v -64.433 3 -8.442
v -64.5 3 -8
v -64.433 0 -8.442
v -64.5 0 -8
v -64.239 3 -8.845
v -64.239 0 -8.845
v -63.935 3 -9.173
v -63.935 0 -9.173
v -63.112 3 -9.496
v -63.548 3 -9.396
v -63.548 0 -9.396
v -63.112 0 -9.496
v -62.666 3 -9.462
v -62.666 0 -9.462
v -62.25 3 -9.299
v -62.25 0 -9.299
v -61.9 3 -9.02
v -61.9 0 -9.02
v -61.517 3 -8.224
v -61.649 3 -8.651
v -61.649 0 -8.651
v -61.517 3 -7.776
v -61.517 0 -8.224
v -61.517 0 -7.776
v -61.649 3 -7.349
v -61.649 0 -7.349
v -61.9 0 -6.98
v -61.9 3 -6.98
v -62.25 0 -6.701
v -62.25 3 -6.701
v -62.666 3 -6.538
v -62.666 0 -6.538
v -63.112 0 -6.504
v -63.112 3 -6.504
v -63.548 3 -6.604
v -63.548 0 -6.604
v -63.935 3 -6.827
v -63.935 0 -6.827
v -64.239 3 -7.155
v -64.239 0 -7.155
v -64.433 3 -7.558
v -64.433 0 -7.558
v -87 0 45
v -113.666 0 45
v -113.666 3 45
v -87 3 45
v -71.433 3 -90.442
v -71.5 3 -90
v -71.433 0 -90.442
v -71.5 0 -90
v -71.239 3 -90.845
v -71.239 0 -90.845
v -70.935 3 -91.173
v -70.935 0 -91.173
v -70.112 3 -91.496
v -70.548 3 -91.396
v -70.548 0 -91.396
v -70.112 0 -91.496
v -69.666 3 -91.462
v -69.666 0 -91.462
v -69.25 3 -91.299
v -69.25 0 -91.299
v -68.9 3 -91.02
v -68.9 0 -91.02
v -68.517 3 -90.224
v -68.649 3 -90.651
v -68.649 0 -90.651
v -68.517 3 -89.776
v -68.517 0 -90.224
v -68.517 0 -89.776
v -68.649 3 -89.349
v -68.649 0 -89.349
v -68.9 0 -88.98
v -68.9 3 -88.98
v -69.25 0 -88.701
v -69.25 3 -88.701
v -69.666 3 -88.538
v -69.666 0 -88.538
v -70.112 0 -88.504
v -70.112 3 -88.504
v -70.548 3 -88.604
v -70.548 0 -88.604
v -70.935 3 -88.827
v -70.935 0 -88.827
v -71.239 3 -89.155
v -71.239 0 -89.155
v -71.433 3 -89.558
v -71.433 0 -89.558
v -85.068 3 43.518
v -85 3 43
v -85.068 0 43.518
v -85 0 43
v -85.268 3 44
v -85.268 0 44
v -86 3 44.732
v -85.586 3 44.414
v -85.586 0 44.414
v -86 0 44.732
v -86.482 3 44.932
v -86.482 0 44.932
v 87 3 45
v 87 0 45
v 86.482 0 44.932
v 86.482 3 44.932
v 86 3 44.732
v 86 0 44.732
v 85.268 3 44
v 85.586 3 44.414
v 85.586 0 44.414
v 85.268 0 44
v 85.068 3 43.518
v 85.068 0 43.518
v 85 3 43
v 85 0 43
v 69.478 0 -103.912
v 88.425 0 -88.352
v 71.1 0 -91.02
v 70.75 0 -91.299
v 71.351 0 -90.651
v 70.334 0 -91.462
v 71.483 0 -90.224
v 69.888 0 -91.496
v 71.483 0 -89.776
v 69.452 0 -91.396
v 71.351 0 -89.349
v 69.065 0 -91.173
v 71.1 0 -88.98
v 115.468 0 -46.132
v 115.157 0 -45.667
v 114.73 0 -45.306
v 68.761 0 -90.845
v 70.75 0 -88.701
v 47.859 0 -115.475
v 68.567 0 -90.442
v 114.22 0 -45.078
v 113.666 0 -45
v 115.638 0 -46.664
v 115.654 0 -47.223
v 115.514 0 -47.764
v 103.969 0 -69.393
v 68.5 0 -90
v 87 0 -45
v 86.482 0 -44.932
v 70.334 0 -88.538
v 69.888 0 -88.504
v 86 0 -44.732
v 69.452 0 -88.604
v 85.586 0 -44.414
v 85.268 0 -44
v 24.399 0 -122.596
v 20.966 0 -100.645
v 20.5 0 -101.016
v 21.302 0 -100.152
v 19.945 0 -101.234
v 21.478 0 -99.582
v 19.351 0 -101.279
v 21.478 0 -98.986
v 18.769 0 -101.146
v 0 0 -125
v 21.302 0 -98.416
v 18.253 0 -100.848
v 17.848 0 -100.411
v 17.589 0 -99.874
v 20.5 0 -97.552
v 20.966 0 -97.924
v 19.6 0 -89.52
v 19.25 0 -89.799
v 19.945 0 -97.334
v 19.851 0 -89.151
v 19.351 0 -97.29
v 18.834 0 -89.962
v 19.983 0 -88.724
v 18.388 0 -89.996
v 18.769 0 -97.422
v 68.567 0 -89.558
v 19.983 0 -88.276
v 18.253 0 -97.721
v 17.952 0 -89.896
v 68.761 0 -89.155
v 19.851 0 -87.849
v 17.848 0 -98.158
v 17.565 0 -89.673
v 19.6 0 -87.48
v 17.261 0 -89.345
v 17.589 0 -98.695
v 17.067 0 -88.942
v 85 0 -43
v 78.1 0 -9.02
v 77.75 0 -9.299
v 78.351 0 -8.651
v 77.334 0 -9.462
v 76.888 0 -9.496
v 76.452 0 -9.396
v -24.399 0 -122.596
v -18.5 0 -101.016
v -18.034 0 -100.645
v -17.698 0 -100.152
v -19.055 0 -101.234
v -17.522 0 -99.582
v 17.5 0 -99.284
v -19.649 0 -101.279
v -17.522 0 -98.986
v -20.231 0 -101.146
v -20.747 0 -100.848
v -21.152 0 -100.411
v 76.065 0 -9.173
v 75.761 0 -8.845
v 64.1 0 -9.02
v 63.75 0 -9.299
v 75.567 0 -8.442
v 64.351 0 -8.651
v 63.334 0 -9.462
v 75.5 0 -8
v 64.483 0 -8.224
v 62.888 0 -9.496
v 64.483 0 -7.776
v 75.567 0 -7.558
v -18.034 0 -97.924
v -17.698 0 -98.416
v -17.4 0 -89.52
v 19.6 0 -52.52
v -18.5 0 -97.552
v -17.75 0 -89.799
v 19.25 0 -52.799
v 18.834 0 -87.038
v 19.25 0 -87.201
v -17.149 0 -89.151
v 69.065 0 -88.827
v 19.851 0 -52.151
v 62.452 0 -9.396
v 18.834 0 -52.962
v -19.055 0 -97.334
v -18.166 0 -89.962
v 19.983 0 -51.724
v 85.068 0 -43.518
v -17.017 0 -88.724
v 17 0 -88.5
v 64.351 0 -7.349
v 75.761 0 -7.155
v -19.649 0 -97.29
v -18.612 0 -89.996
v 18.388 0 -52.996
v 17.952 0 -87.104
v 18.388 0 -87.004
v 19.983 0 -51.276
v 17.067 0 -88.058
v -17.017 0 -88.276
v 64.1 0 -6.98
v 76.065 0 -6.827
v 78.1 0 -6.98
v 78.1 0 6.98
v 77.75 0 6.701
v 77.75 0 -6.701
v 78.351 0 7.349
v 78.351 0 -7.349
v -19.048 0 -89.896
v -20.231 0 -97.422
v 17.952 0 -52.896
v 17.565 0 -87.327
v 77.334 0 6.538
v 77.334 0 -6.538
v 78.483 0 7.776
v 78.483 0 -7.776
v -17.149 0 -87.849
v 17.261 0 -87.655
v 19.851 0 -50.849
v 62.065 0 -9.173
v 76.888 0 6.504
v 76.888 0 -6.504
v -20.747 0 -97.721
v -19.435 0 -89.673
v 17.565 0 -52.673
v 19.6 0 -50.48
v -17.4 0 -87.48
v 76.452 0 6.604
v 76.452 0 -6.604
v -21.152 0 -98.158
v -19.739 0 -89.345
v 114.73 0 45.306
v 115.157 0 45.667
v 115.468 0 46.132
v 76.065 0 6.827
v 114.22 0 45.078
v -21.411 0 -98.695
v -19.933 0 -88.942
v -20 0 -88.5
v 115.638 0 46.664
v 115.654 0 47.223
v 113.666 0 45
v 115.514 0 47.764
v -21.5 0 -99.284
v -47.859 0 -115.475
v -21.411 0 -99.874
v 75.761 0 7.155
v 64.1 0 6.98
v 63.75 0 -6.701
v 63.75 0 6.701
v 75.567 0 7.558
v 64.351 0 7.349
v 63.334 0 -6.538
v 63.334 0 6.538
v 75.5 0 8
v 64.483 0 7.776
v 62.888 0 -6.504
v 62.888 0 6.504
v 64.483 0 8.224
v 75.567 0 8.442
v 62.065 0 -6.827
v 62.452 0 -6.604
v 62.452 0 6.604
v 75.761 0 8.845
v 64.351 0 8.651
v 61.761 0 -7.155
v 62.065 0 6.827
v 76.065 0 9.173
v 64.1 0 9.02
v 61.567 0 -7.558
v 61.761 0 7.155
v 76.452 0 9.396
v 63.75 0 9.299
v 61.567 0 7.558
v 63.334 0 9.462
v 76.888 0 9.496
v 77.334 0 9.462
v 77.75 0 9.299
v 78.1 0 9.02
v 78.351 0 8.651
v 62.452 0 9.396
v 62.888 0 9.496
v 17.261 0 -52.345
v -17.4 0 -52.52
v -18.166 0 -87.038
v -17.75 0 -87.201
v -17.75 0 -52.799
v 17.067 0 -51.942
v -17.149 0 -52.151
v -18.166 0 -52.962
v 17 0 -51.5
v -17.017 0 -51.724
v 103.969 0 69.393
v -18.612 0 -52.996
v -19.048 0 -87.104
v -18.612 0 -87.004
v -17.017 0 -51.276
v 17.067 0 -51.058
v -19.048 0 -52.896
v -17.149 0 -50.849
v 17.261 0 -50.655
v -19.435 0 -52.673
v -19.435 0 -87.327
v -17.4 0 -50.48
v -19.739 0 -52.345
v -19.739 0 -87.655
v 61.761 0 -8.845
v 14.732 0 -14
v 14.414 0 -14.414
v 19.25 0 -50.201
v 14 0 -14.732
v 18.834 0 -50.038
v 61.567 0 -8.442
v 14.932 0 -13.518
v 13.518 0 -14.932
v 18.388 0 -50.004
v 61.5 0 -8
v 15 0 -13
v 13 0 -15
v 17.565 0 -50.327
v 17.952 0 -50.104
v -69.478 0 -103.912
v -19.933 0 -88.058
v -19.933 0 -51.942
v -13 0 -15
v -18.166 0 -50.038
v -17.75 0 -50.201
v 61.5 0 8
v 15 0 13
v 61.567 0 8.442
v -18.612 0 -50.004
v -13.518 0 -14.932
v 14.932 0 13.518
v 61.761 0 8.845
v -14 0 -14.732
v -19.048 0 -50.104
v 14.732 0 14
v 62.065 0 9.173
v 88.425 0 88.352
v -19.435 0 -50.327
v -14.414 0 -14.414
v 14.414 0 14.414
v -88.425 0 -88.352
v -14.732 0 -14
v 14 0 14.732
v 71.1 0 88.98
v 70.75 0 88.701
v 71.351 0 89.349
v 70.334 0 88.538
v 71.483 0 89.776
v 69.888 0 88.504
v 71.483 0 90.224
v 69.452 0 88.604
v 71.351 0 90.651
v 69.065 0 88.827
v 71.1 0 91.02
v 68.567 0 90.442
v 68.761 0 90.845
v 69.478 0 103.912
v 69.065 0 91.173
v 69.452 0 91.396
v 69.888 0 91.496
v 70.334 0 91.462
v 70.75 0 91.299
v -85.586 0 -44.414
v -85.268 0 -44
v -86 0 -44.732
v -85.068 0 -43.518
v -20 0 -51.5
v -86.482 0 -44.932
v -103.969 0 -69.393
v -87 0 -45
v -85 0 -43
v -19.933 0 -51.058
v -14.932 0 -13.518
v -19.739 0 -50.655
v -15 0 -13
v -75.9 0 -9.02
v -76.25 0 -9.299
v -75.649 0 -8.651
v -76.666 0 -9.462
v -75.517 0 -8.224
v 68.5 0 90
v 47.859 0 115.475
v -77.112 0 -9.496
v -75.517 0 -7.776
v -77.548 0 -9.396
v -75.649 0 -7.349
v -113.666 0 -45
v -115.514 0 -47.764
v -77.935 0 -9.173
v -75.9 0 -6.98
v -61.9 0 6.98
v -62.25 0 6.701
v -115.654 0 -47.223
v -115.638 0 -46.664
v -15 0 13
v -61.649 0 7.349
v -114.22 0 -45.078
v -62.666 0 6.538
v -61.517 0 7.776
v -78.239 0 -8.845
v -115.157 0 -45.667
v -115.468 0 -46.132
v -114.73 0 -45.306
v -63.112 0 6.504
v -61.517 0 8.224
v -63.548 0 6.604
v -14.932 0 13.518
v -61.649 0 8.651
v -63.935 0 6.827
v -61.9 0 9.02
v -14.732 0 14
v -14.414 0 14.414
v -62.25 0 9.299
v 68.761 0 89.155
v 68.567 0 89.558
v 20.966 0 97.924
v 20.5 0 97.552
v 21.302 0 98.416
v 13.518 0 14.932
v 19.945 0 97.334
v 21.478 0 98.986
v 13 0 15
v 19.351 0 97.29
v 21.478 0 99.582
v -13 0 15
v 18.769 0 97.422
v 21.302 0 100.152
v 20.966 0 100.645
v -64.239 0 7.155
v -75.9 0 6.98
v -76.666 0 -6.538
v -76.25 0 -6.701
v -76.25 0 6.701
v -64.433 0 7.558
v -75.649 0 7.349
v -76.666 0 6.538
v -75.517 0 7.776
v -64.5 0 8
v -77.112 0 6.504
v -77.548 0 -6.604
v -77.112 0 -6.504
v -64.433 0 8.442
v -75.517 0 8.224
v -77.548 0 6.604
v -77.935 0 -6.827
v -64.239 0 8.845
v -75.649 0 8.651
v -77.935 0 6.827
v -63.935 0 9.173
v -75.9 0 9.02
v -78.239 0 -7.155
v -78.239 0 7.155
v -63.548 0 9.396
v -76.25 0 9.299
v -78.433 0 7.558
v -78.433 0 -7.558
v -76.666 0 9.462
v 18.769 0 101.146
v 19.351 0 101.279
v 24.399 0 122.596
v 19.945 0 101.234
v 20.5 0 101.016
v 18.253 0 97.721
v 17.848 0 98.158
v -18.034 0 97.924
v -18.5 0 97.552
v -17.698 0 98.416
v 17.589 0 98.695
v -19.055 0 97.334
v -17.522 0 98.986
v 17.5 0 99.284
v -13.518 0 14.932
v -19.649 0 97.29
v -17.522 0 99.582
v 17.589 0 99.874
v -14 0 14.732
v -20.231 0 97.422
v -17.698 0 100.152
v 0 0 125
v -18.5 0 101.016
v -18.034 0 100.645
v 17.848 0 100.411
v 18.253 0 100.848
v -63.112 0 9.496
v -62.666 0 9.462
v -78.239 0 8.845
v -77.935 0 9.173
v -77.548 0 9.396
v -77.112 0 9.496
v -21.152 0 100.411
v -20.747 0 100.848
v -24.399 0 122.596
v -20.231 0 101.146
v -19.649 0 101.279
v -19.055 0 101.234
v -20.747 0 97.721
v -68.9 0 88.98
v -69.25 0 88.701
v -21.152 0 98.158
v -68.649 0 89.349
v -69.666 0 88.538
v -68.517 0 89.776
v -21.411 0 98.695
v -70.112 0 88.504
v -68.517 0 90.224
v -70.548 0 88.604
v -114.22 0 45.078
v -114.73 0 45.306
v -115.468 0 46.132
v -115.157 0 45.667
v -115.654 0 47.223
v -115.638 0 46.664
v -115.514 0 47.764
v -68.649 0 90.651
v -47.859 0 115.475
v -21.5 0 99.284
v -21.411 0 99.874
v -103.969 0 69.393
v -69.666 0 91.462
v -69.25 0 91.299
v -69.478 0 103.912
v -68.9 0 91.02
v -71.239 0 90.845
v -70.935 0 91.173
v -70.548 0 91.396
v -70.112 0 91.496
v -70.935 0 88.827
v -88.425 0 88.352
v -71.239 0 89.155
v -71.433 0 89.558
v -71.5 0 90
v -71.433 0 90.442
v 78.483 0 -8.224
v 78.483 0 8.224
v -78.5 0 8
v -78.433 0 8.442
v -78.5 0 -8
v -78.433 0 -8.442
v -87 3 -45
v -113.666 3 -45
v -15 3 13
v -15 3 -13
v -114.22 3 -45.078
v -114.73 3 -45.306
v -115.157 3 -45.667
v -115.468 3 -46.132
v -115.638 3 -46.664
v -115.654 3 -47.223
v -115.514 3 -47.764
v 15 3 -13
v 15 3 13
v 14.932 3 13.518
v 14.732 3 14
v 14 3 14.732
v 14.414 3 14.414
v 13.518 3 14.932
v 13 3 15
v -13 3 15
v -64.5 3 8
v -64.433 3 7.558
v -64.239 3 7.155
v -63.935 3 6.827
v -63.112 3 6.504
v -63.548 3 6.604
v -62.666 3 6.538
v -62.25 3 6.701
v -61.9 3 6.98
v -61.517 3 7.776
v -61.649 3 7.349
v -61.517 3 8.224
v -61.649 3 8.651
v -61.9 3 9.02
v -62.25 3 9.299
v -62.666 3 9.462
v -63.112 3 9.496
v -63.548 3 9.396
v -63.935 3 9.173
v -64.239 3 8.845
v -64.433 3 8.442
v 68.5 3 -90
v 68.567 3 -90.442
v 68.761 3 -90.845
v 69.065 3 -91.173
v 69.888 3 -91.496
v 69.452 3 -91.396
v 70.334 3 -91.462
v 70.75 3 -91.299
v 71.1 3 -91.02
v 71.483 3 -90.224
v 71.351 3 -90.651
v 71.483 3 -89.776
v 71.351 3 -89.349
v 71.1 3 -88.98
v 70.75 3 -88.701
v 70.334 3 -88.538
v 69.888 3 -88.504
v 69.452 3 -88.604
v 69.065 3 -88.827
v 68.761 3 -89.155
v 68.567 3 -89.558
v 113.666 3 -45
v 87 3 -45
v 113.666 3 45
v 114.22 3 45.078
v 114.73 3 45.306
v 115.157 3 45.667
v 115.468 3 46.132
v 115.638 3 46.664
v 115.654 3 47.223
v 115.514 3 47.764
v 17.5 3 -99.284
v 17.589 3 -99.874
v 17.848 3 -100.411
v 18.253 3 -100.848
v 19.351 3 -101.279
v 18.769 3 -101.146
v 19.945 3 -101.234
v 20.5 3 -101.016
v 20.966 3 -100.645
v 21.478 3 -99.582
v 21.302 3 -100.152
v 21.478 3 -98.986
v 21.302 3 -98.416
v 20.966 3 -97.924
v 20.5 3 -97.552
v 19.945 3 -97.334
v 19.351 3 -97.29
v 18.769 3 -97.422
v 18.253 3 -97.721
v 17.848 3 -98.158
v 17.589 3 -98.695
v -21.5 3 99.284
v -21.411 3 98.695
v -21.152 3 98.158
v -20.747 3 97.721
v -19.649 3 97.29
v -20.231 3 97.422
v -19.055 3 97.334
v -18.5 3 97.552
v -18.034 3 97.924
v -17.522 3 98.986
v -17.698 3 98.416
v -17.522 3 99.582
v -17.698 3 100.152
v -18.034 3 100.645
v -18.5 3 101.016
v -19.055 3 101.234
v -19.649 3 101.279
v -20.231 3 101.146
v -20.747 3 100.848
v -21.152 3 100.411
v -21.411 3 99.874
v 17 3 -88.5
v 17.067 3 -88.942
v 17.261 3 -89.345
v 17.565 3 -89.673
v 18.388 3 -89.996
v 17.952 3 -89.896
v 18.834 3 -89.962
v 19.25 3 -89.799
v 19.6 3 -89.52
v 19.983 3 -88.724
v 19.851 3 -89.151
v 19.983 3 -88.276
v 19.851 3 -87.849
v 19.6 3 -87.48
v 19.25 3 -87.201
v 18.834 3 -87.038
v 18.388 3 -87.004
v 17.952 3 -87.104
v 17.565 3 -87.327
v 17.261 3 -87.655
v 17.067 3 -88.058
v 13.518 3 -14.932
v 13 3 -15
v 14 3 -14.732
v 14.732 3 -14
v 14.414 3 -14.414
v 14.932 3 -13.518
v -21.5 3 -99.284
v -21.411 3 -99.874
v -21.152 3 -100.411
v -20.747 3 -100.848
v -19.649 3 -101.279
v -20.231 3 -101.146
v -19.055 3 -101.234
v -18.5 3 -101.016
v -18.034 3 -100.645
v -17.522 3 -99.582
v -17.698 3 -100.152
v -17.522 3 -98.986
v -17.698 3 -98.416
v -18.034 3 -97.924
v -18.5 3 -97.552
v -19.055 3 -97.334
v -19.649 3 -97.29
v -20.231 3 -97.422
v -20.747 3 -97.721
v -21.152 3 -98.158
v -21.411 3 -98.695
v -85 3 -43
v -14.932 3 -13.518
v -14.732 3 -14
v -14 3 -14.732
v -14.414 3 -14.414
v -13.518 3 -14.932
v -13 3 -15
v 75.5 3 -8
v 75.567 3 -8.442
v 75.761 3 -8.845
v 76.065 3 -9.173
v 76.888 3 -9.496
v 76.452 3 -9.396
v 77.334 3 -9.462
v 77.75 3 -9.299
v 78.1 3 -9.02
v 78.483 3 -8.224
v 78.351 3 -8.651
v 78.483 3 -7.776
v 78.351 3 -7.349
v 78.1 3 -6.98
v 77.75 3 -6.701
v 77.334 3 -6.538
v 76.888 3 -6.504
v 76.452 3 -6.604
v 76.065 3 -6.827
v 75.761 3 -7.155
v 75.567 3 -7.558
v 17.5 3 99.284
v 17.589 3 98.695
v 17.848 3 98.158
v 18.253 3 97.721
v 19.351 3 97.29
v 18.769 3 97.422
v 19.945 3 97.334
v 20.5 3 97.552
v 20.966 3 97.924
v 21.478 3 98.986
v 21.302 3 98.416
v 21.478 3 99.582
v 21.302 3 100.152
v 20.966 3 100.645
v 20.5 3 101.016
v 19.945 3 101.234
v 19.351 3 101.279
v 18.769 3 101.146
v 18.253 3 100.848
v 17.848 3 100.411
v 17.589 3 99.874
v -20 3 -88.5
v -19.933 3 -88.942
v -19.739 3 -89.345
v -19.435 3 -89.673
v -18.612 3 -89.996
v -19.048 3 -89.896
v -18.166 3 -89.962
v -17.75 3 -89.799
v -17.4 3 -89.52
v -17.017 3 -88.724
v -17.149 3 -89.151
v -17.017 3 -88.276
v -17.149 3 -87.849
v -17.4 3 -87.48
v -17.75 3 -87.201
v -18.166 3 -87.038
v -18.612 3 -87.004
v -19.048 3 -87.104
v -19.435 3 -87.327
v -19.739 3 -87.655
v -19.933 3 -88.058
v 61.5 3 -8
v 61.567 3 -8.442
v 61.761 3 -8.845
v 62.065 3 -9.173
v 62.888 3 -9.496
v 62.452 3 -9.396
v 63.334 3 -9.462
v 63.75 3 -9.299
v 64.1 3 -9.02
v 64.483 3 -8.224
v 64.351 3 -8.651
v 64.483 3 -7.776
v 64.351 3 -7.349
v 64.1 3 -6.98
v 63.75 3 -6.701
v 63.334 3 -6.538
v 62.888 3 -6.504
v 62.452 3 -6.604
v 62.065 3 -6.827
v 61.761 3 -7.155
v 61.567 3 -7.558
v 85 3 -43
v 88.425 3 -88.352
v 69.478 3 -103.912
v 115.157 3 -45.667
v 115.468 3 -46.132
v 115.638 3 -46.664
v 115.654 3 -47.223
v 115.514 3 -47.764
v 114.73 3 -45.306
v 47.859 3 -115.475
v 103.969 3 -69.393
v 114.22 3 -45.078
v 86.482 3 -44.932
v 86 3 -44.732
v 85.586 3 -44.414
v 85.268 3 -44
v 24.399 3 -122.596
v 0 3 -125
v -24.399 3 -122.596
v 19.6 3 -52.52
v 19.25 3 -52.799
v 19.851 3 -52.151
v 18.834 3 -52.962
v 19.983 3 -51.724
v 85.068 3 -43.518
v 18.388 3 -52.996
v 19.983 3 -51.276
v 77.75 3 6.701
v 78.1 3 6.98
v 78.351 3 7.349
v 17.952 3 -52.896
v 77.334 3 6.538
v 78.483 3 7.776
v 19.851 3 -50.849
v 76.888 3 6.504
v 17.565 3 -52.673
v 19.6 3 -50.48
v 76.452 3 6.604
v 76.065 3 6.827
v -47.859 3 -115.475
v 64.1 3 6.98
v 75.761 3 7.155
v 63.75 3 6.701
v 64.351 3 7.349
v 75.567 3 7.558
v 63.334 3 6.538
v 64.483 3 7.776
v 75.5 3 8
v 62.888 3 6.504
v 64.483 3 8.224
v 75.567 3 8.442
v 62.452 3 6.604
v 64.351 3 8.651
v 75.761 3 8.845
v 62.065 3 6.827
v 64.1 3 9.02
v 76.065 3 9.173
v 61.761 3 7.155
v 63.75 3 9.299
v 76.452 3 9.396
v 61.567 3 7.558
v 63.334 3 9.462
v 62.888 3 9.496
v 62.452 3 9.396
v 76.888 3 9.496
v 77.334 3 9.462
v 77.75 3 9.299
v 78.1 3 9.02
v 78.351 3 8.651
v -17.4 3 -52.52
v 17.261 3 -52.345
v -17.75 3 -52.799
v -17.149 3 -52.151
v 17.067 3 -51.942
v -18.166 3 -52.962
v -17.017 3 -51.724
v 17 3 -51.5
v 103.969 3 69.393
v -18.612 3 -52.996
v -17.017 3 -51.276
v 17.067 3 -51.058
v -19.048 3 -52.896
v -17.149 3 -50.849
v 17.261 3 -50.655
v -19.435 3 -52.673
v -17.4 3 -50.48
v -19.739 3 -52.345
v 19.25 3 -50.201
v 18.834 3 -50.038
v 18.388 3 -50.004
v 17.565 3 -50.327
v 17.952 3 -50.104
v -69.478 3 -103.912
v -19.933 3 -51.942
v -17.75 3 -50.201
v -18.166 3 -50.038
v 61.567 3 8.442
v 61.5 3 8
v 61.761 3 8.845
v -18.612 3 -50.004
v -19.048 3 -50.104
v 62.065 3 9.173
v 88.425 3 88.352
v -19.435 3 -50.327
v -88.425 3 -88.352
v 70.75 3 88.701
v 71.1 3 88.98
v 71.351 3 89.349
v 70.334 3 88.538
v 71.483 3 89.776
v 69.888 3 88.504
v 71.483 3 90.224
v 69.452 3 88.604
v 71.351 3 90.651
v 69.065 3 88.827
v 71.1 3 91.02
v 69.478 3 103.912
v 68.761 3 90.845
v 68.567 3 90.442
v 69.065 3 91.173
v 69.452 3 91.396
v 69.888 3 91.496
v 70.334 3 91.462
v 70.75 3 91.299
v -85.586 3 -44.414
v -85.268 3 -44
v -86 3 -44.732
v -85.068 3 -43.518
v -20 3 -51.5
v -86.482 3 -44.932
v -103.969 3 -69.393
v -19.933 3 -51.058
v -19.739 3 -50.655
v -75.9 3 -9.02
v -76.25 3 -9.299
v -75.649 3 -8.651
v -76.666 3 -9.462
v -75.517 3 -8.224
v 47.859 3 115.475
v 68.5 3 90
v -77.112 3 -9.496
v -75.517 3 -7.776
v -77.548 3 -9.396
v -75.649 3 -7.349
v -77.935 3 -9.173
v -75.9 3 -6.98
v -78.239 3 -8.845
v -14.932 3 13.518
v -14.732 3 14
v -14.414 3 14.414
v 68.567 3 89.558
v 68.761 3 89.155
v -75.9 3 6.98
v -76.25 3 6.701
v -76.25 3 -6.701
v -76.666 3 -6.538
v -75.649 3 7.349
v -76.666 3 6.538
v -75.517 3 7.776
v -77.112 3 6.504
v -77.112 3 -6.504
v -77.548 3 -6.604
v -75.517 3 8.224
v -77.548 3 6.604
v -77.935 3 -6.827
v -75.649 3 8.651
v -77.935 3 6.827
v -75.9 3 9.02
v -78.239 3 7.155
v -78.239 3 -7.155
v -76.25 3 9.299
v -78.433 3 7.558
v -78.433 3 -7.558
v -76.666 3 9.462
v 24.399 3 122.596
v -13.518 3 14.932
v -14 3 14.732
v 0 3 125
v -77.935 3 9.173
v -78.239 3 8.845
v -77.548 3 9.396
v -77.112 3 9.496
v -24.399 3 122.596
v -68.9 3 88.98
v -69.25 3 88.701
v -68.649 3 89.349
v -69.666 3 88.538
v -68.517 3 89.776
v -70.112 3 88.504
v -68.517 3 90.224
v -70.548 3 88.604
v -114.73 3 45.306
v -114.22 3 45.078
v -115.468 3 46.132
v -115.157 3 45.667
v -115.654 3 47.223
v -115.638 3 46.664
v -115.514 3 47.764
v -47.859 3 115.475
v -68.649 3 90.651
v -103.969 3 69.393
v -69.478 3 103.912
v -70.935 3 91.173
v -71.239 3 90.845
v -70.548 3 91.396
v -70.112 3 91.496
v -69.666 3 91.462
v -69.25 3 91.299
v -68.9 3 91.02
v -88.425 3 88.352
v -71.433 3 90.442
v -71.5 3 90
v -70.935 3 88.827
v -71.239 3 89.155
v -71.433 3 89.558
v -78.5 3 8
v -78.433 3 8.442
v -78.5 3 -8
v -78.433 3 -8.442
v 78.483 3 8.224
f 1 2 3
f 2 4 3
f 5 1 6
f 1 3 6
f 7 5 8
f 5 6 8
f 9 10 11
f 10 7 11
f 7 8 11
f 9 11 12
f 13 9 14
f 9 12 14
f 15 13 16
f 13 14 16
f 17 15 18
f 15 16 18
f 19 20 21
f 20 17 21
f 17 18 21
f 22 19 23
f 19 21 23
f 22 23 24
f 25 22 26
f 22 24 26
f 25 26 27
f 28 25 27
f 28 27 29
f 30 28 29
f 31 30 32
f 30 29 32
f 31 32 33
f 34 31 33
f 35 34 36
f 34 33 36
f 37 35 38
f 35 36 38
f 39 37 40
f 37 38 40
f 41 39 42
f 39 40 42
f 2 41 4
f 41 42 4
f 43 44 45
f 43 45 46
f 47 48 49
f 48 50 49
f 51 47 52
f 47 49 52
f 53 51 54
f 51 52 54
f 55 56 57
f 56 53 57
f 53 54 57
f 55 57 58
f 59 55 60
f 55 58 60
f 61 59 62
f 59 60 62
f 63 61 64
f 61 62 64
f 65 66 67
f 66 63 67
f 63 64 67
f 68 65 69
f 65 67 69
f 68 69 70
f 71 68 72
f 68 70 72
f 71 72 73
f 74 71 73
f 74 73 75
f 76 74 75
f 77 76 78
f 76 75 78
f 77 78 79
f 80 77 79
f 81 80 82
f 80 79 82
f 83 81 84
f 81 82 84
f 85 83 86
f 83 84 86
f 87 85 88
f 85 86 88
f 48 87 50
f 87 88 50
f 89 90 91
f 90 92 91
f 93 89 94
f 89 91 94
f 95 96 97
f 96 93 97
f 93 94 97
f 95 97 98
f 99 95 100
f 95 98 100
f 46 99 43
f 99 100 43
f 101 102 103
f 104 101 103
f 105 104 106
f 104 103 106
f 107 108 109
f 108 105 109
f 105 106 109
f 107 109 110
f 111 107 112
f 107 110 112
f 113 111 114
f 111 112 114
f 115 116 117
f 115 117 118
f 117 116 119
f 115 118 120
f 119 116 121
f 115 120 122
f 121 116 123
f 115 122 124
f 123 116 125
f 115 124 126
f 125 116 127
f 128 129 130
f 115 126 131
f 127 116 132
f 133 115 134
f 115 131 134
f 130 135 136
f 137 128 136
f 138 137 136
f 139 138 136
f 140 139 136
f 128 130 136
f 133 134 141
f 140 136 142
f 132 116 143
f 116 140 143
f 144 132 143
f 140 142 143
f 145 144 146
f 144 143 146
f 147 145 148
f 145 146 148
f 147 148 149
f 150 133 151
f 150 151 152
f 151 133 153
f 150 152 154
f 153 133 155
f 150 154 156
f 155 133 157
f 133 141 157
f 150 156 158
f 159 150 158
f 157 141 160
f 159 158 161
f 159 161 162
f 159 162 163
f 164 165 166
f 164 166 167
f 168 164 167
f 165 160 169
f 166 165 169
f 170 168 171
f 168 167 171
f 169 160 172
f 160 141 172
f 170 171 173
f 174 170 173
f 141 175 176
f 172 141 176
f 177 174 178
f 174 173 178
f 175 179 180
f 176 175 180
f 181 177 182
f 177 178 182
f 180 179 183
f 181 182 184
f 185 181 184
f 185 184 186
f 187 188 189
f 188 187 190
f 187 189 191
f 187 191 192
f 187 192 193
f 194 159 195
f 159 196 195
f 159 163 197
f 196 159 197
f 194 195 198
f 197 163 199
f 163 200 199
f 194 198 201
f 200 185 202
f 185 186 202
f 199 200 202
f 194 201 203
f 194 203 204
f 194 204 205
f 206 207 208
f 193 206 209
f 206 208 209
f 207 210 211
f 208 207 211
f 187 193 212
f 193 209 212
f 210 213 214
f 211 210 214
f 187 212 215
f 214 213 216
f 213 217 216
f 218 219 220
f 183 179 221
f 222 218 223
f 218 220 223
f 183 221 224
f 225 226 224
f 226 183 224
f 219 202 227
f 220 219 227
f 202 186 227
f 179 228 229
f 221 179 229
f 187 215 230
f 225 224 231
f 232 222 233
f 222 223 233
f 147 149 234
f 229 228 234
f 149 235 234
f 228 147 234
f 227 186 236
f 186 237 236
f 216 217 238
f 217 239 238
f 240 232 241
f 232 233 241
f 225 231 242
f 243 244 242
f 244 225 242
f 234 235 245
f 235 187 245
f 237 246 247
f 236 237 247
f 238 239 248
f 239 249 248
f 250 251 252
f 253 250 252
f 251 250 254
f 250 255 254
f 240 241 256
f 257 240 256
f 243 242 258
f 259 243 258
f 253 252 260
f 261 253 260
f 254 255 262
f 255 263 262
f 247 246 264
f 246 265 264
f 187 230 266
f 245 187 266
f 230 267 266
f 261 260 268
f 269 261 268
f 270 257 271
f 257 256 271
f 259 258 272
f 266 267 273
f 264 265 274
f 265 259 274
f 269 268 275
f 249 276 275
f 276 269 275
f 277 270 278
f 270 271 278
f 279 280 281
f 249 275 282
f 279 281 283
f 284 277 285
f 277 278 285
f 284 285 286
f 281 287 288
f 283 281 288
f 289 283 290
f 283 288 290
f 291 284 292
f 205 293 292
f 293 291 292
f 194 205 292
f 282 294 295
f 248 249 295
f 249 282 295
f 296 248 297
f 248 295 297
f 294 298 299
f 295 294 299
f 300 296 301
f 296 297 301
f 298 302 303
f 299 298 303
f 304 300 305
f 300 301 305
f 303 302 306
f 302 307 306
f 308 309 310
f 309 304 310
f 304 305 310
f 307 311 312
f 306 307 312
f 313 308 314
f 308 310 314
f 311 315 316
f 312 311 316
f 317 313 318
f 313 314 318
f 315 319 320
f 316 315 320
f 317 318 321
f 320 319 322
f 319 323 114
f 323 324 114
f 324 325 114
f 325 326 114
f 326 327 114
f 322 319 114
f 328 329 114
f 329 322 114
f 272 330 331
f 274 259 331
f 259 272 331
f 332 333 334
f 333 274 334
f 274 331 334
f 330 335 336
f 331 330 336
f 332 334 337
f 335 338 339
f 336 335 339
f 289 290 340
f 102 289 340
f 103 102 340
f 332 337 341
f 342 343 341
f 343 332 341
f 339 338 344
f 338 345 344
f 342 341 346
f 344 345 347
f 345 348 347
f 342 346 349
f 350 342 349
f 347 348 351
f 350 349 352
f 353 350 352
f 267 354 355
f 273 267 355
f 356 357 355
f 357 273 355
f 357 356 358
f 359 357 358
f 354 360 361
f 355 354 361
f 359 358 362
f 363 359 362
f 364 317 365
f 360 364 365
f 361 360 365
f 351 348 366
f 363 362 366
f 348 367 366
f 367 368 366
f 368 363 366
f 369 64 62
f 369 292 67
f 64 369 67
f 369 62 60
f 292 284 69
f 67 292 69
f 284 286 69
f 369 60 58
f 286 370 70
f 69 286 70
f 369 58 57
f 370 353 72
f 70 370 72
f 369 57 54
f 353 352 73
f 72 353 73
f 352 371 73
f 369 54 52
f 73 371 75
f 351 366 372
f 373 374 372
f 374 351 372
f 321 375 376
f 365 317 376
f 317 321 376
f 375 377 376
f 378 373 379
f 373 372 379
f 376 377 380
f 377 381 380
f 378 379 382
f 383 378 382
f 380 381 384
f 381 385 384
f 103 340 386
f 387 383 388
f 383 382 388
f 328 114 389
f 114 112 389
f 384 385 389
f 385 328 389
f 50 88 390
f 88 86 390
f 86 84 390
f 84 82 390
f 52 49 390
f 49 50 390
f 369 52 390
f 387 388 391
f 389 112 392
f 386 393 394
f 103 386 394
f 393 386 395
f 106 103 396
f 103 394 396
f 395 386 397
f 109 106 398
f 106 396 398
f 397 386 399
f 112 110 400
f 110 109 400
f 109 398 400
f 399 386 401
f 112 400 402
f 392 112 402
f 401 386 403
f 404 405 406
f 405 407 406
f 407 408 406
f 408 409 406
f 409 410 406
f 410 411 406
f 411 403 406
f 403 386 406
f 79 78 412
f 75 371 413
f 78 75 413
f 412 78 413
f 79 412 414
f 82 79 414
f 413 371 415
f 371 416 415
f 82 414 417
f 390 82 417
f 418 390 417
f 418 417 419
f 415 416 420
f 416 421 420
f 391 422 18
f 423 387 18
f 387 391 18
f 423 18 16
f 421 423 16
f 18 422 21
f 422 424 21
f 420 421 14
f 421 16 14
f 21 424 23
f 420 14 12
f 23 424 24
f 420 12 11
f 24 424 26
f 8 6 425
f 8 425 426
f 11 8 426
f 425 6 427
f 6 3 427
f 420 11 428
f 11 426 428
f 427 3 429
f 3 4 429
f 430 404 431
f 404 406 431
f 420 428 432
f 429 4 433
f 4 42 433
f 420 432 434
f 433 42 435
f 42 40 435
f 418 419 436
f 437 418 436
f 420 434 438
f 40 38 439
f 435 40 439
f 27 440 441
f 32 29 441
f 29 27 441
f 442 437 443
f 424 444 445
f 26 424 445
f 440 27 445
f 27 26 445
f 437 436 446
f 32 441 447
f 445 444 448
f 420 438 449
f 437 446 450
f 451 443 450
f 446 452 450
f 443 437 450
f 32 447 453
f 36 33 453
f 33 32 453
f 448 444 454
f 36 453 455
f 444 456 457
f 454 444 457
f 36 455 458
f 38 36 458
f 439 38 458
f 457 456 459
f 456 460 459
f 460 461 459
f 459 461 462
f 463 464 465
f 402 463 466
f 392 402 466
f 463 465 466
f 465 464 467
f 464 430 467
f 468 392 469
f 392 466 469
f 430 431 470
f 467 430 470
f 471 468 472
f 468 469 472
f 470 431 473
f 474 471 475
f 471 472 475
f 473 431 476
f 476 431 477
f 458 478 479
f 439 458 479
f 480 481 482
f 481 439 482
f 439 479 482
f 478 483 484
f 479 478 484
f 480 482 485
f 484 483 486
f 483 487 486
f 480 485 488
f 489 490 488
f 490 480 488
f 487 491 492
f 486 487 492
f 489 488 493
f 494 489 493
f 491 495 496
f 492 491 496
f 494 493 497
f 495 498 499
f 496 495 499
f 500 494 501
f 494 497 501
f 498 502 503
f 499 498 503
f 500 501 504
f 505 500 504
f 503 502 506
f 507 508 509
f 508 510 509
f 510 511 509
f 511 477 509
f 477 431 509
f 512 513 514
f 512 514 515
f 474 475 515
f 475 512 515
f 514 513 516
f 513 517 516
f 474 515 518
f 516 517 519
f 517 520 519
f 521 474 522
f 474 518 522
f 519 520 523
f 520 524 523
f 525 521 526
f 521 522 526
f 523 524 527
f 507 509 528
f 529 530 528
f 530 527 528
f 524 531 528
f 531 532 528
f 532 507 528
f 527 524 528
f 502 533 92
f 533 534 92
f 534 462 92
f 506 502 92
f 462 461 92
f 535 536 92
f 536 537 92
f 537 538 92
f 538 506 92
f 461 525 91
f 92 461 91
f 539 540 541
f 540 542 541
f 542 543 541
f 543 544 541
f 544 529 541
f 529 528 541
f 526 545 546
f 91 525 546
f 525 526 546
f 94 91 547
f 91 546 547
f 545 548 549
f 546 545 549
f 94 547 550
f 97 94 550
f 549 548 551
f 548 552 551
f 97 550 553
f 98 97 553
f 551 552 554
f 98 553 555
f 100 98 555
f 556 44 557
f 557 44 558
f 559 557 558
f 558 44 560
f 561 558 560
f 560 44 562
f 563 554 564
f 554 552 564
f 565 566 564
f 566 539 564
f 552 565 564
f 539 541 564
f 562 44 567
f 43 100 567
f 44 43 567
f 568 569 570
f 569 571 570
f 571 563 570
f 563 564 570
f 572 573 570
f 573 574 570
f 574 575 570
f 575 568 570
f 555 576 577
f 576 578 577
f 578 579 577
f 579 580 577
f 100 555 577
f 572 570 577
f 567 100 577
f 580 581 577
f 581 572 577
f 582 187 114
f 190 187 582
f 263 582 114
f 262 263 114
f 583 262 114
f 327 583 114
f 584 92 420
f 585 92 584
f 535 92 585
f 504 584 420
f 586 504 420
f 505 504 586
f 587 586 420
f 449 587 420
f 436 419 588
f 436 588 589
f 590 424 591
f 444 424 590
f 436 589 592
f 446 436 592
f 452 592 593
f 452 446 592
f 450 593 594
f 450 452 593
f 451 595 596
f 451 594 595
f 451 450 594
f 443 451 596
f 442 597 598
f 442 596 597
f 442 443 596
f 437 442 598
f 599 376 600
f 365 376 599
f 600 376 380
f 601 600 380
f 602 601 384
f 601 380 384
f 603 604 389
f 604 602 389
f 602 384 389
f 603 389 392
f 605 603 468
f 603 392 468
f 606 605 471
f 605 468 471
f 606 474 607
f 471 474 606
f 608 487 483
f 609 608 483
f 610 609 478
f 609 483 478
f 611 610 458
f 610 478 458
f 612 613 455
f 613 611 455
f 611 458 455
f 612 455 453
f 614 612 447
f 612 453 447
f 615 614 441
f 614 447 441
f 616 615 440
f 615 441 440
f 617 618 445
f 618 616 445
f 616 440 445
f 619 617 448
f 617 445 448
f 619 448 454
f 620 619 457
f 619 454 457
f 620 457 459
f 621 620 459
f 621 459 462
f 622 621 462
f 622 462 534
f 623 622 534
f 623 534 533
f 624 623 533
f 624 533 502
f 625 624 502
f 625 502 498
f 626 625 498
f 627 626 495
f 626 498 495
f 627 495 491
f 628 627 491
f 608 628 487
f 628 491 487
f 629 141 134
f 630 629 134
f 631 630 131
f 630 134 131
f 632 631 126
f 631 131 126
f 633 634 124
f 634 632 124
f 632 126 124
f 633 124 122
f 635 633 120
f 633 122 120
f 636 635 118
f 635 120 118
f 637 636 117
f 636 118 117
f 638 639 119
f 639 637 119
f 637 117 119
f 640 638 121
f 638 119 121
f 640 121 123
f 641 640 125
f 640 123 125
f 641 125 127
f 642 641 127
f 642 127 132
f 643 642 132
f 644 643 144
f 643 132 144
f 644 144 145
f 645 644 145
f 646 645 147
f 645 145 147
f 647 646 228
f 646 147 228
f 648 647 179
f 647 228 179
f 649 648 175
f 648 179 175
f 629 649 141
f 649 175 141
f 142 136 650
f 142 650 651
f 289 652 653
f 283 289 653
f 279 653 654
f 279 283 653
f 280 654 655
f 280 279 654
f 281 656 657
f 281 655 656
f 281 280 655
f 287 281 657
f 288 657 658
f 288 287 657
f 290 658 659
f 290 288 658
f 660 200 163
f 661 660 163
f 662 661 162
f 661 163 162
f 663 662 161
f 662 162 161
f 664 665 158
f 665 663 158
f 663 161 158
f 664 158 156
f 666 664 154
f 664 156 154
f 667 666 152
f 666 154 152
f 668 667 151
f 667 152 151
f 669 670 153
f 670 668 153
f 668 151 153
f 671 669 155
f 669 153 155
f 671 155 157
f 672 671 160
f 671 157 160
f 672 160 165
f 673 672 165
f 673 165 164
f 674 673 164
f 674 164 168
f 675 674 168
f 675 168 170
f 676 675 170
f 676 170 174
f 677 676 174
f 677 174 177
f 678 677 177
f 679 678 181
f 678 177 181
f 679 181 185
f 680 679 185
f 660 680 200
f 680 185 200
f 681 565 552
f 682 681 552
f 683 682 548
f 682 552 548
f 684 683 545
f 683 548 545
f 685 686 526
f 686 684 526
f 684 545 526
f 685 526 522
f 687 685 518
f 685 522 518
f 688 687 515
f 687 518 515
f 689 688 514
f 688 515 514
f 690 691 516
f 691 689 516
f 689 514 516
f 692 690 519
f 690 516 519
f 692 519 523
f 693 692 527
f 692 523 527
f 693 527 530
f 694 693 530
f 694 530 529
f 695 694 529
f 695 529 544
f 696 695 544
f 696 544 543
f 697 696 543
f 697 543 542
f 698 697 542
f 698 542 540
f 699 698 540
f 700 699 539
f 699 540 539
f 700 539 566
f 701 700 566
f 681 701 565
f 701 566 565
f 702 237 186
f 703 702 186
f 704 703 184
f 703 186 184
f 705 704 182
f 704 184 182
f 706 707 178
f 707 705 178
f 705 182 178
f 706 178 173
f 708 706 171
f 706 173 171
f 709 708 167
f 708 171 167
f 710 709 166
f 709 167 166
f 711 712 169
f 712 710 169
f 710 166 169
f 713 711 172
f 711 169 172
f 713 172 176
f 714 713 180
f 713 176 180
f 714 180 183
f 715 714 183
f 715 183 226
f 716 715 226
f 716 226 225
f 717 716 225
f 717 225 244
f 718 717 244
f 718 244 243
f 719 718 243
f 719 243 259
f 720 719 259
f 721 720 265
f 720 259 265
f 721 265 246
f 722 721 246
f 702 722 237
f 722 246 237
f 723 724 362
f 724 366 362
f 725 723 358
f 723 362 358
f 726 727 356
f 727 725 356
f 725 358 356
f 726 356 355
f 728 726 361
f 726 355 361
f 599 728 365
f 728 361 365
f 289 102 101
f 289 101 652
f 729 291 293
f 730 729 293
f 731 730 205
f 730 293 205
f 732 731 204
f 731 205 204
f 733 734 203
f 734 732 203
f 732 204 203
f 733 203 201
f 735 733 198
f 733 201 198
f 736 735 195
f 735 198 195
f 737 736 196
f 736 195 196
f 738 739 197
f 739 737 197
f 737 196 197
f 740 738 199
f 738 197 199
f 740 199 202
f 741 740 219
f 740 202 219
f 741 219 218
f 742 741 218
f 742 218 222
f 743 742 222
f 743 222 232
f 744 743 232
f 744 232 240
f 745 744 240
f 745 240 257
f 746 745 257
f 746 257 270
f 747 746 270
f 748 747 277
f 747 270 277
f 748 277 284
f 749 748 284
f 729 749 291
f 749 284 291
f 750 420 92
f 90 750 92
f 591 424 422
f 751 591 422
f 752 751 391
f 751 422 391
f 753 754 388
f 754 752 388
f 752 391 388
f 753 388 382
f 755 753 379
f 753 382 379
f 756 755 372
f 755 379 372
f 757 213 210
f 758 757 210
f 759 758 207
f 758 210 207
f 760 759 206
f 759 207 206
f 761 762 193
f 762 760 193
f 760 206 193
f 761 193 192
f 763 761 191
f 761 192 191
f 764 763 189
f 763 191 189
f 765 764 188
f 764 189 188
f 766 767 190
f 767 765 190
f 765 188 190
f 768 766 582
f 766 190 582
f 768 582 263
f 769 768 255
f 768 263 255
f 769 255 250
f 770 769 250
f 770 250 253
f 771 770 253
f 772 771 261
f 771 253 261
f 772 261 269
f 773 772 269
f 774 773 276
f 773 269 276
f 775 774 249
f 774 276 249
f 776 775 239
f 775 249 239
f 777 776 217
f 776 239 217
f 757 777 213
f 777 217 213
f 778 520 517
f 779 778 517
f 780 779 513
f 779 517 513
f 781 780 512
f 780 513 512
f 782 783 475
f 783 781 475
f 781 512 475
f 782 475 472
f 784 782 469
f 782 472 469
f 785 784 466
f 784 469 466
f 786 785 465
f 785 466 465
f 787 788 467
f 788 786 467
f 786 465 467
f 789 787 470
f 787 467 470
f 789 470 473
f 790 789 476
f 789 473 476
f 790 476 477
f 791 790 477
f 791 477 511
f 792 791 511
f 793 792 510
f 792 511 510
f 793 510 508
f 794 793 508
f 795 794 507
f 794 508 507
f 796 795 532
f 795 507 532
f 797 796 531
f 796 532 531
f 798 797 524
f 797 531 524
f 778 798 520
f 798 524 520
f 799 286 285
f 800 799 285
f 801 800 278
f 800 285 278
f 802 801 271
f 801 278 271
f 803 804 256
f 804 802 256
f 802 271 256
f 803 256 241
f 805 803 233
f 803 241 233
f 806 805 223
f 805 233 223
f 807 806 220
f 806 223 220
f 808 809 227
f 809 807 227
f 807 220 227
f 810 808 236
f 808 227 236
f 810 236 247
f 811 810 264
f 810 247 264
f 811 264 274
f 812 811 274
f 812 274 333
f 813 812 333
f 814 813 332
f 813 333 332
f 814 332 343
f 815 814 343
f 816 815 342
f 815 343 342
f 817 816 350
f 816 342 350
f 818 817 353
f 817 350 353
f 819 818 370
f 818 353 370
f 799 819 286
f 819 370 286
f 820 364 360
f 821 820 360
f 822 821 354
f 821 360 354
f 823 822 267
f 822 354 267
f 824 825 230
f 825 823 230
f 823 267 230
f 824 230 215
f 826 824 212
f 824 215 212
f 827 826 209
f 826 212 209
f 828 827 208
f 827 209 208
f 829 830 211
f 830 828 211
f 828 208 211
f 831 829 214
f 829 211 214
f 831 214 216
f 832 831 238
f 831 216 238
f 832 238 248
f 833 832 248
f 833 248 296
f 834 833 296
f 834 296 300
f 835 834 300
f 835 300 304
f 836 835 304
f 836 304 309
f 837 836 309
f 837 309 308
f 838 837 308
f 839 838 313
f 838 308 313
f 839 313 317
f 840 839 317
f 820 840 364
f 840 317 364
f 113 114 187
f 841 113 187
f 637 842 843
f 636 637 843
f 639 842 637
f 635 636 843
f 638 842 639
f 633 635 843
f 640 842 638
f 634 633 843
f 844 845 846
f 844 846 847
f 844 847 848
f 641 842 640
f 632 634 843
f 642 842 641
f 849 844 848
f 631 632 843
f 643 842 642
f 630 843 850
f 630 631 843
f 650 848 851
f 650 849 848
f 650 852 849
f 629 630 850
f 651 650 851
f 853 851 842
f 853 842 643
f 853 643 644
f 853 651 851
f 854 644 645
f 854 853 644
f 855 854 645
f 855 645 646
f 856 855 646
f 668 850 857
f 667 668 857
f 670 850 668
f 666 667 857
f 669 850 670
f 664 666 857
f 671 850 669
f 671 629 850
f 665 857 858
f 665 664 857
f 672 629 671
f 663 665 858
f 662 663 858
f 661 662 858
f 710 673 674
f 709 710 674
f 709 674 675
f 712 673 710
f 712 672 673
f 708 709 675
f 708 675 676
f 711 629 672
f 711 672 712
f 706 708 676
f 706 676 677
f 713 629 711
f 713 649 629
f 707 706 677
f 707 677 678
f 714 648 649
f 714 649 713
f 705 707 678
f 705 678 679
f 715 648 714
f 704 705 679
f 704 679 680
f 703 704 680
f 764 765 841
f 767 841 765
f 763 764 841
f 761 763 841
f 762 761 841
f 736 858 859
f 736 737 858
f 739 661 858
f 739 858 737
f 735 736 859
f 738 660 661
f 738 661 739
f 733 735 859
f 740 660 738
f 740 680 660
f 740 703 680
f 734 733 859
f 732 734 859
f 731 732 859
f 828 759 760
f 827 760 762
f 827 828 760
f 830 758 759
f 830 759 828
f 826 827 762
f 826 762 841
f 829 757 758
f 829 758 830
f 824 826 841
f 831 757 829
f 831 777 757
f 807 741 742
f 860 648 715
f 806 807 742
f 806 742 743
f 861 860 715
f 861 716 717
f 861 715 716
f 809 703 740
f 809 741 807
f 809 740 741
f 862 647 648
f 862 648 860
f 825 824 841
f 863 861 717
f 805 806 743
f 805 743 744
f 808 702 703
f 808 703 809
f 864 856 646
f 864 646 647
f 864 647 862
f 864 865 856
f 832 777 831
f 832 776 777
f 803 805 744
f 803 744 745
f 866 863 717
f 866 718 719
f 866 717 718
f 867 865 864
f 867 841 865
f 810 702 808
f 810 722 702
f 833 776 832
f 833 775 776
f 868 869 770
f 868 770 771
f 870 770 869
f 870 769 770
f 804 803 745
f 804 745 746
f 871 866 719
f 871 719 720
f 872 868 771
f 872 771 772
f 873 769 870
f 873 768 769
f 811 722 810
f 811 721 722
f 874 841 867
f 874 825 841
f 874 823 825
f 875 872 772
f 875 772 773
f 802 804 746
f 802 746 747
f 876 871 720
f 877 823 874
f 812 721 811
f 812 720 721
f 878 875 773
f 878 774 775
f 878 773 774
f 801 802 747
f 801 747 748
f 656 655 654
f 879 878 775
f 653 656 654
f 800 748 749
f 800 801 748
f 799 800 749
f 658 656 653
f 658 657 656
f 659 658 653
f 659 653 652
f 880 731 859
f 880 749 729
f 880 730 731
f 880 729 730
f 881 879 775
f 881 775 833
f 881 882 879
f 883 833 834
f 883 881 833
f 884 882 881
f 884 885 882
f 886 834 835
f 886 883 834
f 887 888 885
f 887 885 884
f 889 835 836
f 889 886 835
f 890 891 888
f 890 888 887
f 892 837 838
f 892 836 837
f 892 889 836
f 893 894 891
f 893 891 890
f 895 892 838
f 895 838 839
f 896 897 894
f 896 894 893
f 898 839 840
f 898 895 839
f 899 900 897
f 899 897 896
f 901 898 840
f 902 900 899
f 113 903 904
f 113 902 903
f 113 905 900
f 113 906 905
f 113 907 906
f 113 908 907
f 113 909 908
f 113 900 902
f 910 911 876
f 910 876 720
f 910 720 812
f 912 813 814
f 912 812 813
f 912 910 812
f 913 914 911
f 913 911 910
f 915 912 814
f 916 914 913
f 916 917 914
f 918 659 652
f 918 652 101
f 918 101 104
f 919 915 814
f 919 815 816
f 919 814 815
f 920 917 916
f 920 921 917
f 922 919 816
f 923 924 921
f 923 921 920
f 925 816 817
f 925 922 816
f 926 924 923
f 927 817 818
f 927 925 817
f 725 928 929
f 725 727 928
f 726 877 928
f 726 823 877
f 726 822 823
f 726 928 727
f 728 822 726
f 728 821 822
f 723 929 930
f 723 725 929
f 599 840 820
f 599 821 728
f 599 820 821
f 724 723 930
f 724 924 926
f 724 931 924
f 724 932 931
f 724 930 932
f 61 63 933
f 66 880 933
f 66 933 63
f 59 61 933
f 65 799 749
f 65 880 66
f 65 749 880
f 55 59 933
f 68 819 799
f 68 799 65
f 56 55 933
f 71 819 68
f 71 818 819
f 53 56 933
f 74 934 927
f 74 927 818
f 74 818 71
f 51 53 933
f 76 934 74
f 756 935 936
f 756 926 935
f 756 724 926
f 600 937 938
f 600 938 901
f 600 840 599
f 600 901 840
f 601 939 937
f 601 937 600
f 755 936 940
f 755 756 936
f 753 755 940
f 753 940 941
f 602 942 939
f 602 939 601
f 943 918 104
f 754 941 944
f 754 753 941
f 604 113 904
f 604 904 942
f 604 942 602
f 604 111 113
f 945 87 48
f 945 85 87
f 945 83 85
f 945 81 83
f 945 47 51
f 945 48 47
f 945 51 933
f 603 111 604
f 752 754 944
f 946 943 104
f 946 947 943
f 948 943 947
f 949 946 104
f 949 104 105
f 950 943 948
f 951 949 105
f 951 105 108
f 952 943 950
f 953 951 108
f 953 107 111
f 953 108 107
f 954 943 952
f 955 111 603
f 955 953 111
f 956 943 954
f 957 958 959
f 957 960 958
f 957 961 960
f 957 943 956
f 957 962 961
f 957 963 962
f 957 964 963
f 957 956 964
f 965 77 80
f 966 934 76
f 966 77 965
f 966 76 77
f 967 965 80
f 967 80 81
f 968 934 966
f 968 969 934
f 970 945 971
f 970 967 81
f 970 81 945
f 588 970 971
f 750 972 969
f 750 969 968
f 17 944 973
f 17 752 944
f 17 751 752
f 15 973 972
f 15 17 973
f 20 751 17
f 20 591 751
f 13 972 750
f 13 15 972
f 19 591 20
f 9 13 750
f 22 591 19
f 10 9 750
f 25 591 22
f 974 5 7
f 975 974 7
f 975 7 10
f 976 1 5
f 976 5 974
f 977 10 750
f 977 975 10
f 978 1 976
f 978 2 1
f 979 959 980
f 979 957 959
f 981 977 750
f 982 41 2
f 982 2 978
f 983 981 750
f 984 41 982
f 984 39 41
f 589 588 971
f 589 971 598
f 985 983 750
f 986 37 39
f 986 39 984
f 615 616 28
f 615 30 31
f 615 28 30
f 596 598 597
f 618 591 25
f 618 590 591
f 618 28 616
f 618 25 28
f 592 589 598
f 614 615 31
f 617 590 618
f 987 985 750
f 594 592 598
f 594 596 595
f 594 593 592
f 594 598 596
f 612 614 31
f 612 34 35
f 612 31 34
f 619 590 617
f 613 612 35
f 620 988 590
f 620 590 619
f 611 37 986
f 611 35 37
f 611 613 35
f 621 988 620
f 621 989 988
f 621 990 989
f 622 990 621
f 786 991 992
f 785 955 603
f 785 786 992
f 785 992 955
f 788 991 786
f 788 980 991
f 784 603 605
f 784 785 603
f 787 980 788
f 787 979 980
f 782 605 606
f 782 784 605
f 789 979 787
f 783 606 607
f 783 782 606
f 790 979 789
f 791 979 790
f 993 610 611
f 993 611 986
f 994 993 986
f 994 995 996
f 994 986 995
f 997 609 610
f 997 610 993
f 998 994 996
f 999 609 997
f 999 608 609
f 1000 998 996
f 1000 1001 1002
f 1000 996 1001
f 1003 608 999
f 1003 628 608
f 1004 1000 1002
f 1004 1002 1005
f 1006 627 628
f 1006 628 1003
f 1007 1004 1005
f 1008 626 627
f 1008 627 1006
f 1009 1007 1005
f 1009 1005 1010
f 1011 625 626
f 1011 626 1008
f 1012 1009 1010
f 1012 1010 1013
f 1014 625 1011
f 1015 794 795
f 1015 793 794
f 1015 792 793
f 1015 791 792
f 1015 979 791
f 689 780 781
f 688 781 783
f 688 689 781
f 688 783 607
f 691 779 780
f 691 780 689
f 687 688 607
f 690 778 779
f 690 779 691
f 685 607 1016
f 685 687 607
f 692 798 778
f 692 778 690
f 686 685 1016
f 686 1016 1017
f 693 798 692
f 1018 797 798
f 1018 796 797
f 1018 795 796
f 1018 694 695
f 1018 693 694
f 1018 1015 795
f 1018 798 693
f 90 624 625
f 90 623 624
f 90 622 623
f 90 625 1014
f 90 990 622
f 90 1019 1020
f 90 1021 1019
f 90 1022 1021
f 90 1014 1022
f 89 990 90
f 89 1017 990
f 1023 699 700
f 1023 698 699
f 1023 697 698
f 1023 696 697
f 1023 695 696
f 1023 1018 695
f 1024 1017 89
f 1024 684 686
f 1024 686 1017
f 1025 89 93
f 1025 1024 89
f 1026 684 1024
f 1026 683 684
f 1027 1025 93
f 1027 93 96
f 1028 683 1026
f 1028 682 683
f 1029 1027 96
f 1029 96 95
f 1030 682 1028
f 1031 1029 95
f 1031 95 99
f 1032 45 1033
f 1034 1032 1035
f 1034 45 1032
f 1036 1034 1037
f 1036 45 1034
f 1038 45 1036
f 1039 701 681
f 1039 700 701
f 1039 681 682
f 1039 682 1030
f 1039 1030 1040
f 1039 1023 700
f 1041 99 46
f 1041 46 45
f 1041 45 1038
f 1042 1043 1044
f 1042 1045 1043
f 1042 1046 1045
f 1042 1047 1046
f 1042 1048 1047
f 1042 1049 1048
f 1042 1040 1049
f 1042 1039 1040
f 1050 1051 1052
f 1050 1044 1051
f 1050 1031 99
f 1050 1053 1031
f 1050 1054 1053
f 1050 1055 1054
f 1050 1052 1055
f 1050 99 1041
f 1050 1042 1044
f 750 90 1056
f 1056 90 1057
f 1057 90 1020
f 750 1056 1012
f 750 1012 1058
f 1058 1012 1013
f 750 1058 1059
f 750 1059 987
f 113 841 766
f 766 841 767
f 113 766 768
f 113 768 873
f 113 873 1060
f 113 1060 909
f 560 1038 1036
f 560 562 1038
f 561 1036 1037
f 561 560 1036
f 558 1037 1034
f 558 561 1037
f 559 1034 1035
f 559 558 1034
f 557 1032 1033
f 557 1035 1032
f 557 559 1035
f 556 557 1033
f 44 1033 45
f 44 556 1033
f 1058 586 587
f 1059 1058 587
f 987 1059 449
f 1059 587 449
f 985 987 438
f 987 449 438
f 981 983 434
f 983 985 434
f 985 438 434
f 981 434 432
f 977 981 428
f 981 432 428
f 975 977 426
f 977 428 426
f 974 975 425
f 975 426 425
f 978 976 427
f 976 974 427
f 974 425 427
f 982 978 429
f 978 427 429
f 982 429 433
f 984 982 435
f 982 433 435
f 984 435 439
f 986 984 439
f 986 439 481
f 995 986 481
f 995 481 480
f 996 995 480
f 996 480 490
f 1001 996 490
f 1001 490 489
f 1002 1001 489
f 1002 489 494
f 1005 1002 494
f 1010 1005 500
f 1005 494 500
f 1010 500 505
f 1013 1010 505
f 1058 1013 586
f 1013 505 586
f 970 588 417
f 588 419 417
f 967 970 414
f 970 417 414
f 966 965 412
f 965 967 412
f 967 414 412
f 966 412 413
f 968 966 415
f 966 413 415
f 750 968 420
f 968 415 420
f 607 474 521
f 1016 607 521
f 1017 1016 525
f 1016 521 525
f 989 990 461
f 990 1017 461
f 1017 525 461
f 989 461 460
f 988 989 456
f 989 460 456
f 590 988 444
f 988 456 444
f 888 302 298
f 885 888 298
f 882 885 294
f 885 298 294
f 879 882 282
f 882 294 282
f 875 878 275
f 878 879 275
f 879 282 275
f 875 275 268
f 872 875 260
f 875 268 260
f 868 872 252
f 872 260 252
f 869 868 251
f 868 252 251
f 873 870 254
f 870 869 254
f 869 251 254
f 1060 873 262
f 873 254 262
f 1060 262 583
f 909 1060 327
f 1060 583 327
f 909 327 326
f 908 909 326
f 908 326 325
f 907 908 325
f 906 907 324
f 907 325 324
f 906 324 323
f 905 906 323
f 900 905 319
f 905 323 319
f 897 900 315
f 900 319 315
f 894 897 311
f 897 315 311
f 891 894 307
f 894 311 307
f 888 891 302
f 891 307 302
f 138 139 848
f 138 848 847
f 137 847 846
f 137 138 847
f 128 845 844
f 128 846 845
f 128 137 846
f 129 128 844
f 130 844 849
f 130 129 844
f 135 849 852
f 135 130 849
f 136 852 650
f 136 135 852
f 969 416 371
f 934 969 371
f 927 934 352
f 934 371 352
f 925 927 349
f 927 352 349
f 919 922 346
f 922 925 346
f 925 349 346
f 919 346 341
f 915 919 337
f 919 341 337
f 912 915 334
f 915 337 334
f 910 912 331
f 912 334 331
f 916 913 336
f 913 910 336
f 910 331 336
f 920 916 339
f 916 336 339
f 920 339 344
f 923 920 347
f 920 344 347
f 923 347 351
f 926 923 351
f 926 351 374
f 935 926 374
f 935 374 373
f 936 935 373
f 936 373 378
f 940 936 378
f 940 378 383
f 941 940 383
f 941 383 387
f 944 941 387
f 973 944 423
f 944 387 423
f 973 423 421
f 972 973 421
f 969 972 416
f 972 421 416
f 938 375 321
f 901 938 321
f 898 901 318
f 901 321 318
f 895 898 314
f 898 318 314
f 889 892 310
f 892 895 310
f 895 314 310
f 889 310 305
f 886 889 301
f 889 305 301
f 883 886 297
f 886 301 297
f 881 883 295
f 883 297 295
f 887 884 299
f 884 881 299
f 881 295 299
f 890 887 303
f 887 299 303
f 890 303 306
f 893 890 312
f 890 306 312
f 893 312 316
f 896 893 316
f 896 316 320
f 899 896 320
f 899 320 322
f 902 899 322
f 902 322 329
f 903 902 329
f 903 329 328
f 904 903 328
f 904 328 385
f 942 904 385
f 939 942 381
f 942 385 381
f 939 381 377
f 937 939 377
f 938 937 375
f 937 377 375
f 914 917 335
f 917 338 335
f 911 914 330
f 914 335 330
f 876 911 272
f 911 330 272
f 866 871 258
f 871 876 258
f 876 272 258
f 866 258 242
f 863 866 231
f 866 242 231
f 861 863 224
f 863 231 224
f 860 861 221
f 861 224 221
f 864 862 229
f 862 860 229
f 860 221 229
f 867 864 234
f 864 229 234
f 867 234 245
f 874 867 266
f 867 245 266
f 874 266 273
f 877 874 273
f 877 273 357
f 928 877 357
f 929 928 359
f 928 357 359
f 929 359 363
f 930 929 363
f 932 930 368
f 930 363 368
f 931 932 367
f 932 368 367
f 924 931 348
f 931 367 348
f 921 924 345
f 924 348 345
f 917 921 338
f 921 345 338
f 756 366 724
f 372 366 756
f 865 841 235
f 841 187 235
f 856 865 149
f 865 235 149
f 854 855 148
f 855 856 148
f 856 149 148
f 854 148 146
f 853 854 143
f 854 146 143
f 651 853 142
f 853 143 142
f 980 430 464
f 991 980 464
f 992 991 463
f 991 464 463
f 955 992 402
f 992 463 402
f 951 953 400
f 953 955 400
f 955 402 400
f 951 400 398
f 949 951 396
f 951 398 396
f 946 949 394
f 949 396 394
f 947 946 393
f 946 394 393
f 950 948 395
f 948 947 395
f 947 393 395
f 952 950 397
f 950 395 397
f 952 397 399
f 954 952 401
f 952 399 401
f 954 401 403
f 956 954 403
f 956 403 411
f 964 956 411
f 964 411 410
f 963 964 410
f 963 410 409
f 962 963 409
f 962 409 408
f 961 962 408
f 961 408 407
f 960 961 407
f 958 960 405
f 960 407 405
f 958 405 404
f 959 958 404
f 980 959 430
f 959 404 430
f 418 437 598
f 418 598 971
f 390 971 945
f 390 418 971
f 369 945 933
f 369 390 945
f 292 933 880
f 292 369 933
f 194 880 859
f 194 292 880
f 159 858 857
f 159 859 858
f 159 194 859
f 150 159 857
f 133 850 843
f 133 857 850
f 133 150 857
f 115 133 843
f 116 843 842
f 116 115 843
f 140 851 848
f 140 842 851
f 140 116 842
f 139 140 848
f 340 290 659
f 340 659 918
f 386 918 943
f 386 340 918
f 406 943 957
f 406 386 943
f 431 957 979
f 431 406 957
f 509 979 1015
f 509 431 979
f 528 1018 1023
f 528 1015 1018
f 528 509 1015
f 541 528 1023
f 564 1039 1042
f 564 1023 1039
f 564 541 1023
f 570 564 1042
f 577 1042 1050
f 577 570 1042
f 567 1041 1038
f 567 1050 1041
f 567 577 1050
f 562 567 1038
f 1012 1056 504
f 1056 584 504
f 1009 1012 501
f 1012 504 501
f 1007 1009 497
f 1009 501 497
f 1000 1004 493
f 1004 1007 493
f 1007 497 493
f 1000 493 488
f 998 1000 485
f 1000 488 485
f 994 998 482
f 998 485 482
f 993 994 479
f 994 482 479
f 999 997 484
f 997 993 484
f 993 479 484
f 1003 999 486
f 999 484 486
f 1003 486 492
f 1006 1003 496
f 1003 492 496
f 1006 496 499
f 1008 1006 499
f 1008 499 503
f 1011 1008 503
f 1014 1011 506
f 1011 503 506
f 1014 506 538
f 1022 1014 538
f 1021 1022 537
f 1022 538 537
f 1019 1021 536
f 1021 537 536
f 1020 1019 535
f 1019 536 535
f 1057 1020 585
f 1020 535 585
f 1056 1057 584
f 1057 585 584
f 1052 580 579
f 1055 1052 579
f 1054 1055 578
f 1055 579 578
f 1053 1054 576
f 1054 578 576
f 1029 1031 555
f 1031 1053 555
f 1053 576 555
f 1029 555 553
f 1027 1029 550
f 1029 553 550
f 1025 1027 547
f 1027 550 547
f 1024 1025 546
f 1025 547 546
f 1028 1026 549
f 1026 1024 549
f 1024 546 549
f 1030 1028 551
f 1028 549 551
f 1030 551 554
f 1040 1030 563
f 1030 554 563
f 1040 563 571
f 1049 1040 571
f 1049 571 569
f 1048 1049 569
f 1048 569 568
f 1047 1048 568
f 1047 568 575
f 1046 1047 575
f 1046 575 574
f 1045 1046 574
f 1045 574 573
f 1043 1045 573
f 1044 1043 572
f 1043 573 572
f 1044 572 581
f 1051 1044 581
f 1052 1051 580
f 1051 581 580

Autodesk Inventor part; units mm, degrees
ref_plane "YZ Plane" through (0, 0, 0) normal (1, 0, 0) x (0, 1, 0)
ref_plane "XZ Plane" through (0, 0, 0) normal (0, 1, 0) x (-1, 0, 0)
ref_plane "XY Plane" through (0, 0, 0) normal (0, 0, 1) x (1, 0, 0)
sketch "Sketch1" plane through (0, 0, 0) normal (0, 1, 0) x (-1, 0, 0)
  line L0 (-85, 43) -> (-85, -43)
  line L1 (85, -43) -> (85, 43)
  arc A0 (-115.5144, -47.7642) -> (115.5144, -47.7642) centre (0, 0) ccw
  arc A1 (115.5144, 47.7642) -> (-115.5144, 47.7642) centre (0, 0) ccw
  line L2 (113.6662, 45) -> (87, 45)
  line L3 (-87, 45) -> (-113.6662, 45)
  line L4 (87, -45) -> (113.6662, -45)
  line L5 (-113.6662, -45) -> (-87, -45)
  circle A2 centre (63, -8) radius 1.5
  circle A3 centre (63, 8) radius 1.5
  circle A4 centre (77, 8) radius 1.5
  circle A5 centre (77, -8) radius 1.5
  circle A6 centre (-63, -8) radius 1.5
  circle A7 centre (-63, 8) radius 1.5
  circle A8 centre (-77, 8) radius 1.5
  circle A9 centre (-77, -8) radius 1.5
  circle A10 centre (70, -90) radius 1.5
  circle A11 centre (-70, -90) radius 1.5
  circle A12 centre (-70, 90) radius 1.5
  circle A13 centre (70, 90) radius 1.5
  line L6 (13, 15) -> (-13, 15)
  line L7 (-15, 13) -> (-15, -13)
  line L8 (-13, -15) -> (13, -15)
  line L9 (15, -13) -> (15, 13)
  circle A14 centre (-18.5, -51.5) radius 1.5
  circle A15 centre (-18.5, -88.5) radius 1.5
  circle A16 centre (18.5, -88.5) radius 1.5
  circle A17 centre (18.5, -51.5) radius 1.5
  arc A18 (115.5144, -47.7642) -> (113.6662, -45) centre (113.6662, -47) ccw
  arc A19 (85, -43) -> (87, -45) centre (87, -43) ccw
  arc A20 (87, 45) -> (85, 43) centre (87, 43) ccw
  arc A21 (113.6662, 45) -> (115.5144, 47.7642) centre (113.6662, 47) ccw
  arc A22 (-115.5144, 47.7642) -> (-113.6662, 45) centre (-113.6662, 47) ccw
  arc A23 (-85, 43) -> (-87, 45) centre (-87, 43) ccw
  arc A24 (-87, -45) -> (-85, -43) centre (-87, -43) ccw
  arc A25 (-113.6662, -45) -> (-115.5144, -47.7642) centre (-113.6662, -47) ccw
  arc A26 (-15, -13) -> (-13, -15) centre (-13, -13) ccw
  arc A27 (-13, 15) -> (-15, 13) centre (-13, 13) ccw
  arc A28 (15, 13) -> (13, 15) centre (13, 13) ccw
  arc A29 (13, -15) -> (15, -13) centre (13, -13) ccw
  circle A30 centre (-19.5, -99.2842) radius 2
  circle A31 centre (19.5, -99.2842) radius 2
  circle A32 centre (-19.5, 99.2842) radius 2
  circle A33 centre (19.5, 99.2842) radius 2
  point P0 (116.619, -45)
  point P1 (116.619, 45)
  point P2 (-116.619, 45)
  point P3 (-116.619, -45)
  point P4 (85, 0)
extrude "Extrusion2" add sketch "Sketch1" along normal blind 3
